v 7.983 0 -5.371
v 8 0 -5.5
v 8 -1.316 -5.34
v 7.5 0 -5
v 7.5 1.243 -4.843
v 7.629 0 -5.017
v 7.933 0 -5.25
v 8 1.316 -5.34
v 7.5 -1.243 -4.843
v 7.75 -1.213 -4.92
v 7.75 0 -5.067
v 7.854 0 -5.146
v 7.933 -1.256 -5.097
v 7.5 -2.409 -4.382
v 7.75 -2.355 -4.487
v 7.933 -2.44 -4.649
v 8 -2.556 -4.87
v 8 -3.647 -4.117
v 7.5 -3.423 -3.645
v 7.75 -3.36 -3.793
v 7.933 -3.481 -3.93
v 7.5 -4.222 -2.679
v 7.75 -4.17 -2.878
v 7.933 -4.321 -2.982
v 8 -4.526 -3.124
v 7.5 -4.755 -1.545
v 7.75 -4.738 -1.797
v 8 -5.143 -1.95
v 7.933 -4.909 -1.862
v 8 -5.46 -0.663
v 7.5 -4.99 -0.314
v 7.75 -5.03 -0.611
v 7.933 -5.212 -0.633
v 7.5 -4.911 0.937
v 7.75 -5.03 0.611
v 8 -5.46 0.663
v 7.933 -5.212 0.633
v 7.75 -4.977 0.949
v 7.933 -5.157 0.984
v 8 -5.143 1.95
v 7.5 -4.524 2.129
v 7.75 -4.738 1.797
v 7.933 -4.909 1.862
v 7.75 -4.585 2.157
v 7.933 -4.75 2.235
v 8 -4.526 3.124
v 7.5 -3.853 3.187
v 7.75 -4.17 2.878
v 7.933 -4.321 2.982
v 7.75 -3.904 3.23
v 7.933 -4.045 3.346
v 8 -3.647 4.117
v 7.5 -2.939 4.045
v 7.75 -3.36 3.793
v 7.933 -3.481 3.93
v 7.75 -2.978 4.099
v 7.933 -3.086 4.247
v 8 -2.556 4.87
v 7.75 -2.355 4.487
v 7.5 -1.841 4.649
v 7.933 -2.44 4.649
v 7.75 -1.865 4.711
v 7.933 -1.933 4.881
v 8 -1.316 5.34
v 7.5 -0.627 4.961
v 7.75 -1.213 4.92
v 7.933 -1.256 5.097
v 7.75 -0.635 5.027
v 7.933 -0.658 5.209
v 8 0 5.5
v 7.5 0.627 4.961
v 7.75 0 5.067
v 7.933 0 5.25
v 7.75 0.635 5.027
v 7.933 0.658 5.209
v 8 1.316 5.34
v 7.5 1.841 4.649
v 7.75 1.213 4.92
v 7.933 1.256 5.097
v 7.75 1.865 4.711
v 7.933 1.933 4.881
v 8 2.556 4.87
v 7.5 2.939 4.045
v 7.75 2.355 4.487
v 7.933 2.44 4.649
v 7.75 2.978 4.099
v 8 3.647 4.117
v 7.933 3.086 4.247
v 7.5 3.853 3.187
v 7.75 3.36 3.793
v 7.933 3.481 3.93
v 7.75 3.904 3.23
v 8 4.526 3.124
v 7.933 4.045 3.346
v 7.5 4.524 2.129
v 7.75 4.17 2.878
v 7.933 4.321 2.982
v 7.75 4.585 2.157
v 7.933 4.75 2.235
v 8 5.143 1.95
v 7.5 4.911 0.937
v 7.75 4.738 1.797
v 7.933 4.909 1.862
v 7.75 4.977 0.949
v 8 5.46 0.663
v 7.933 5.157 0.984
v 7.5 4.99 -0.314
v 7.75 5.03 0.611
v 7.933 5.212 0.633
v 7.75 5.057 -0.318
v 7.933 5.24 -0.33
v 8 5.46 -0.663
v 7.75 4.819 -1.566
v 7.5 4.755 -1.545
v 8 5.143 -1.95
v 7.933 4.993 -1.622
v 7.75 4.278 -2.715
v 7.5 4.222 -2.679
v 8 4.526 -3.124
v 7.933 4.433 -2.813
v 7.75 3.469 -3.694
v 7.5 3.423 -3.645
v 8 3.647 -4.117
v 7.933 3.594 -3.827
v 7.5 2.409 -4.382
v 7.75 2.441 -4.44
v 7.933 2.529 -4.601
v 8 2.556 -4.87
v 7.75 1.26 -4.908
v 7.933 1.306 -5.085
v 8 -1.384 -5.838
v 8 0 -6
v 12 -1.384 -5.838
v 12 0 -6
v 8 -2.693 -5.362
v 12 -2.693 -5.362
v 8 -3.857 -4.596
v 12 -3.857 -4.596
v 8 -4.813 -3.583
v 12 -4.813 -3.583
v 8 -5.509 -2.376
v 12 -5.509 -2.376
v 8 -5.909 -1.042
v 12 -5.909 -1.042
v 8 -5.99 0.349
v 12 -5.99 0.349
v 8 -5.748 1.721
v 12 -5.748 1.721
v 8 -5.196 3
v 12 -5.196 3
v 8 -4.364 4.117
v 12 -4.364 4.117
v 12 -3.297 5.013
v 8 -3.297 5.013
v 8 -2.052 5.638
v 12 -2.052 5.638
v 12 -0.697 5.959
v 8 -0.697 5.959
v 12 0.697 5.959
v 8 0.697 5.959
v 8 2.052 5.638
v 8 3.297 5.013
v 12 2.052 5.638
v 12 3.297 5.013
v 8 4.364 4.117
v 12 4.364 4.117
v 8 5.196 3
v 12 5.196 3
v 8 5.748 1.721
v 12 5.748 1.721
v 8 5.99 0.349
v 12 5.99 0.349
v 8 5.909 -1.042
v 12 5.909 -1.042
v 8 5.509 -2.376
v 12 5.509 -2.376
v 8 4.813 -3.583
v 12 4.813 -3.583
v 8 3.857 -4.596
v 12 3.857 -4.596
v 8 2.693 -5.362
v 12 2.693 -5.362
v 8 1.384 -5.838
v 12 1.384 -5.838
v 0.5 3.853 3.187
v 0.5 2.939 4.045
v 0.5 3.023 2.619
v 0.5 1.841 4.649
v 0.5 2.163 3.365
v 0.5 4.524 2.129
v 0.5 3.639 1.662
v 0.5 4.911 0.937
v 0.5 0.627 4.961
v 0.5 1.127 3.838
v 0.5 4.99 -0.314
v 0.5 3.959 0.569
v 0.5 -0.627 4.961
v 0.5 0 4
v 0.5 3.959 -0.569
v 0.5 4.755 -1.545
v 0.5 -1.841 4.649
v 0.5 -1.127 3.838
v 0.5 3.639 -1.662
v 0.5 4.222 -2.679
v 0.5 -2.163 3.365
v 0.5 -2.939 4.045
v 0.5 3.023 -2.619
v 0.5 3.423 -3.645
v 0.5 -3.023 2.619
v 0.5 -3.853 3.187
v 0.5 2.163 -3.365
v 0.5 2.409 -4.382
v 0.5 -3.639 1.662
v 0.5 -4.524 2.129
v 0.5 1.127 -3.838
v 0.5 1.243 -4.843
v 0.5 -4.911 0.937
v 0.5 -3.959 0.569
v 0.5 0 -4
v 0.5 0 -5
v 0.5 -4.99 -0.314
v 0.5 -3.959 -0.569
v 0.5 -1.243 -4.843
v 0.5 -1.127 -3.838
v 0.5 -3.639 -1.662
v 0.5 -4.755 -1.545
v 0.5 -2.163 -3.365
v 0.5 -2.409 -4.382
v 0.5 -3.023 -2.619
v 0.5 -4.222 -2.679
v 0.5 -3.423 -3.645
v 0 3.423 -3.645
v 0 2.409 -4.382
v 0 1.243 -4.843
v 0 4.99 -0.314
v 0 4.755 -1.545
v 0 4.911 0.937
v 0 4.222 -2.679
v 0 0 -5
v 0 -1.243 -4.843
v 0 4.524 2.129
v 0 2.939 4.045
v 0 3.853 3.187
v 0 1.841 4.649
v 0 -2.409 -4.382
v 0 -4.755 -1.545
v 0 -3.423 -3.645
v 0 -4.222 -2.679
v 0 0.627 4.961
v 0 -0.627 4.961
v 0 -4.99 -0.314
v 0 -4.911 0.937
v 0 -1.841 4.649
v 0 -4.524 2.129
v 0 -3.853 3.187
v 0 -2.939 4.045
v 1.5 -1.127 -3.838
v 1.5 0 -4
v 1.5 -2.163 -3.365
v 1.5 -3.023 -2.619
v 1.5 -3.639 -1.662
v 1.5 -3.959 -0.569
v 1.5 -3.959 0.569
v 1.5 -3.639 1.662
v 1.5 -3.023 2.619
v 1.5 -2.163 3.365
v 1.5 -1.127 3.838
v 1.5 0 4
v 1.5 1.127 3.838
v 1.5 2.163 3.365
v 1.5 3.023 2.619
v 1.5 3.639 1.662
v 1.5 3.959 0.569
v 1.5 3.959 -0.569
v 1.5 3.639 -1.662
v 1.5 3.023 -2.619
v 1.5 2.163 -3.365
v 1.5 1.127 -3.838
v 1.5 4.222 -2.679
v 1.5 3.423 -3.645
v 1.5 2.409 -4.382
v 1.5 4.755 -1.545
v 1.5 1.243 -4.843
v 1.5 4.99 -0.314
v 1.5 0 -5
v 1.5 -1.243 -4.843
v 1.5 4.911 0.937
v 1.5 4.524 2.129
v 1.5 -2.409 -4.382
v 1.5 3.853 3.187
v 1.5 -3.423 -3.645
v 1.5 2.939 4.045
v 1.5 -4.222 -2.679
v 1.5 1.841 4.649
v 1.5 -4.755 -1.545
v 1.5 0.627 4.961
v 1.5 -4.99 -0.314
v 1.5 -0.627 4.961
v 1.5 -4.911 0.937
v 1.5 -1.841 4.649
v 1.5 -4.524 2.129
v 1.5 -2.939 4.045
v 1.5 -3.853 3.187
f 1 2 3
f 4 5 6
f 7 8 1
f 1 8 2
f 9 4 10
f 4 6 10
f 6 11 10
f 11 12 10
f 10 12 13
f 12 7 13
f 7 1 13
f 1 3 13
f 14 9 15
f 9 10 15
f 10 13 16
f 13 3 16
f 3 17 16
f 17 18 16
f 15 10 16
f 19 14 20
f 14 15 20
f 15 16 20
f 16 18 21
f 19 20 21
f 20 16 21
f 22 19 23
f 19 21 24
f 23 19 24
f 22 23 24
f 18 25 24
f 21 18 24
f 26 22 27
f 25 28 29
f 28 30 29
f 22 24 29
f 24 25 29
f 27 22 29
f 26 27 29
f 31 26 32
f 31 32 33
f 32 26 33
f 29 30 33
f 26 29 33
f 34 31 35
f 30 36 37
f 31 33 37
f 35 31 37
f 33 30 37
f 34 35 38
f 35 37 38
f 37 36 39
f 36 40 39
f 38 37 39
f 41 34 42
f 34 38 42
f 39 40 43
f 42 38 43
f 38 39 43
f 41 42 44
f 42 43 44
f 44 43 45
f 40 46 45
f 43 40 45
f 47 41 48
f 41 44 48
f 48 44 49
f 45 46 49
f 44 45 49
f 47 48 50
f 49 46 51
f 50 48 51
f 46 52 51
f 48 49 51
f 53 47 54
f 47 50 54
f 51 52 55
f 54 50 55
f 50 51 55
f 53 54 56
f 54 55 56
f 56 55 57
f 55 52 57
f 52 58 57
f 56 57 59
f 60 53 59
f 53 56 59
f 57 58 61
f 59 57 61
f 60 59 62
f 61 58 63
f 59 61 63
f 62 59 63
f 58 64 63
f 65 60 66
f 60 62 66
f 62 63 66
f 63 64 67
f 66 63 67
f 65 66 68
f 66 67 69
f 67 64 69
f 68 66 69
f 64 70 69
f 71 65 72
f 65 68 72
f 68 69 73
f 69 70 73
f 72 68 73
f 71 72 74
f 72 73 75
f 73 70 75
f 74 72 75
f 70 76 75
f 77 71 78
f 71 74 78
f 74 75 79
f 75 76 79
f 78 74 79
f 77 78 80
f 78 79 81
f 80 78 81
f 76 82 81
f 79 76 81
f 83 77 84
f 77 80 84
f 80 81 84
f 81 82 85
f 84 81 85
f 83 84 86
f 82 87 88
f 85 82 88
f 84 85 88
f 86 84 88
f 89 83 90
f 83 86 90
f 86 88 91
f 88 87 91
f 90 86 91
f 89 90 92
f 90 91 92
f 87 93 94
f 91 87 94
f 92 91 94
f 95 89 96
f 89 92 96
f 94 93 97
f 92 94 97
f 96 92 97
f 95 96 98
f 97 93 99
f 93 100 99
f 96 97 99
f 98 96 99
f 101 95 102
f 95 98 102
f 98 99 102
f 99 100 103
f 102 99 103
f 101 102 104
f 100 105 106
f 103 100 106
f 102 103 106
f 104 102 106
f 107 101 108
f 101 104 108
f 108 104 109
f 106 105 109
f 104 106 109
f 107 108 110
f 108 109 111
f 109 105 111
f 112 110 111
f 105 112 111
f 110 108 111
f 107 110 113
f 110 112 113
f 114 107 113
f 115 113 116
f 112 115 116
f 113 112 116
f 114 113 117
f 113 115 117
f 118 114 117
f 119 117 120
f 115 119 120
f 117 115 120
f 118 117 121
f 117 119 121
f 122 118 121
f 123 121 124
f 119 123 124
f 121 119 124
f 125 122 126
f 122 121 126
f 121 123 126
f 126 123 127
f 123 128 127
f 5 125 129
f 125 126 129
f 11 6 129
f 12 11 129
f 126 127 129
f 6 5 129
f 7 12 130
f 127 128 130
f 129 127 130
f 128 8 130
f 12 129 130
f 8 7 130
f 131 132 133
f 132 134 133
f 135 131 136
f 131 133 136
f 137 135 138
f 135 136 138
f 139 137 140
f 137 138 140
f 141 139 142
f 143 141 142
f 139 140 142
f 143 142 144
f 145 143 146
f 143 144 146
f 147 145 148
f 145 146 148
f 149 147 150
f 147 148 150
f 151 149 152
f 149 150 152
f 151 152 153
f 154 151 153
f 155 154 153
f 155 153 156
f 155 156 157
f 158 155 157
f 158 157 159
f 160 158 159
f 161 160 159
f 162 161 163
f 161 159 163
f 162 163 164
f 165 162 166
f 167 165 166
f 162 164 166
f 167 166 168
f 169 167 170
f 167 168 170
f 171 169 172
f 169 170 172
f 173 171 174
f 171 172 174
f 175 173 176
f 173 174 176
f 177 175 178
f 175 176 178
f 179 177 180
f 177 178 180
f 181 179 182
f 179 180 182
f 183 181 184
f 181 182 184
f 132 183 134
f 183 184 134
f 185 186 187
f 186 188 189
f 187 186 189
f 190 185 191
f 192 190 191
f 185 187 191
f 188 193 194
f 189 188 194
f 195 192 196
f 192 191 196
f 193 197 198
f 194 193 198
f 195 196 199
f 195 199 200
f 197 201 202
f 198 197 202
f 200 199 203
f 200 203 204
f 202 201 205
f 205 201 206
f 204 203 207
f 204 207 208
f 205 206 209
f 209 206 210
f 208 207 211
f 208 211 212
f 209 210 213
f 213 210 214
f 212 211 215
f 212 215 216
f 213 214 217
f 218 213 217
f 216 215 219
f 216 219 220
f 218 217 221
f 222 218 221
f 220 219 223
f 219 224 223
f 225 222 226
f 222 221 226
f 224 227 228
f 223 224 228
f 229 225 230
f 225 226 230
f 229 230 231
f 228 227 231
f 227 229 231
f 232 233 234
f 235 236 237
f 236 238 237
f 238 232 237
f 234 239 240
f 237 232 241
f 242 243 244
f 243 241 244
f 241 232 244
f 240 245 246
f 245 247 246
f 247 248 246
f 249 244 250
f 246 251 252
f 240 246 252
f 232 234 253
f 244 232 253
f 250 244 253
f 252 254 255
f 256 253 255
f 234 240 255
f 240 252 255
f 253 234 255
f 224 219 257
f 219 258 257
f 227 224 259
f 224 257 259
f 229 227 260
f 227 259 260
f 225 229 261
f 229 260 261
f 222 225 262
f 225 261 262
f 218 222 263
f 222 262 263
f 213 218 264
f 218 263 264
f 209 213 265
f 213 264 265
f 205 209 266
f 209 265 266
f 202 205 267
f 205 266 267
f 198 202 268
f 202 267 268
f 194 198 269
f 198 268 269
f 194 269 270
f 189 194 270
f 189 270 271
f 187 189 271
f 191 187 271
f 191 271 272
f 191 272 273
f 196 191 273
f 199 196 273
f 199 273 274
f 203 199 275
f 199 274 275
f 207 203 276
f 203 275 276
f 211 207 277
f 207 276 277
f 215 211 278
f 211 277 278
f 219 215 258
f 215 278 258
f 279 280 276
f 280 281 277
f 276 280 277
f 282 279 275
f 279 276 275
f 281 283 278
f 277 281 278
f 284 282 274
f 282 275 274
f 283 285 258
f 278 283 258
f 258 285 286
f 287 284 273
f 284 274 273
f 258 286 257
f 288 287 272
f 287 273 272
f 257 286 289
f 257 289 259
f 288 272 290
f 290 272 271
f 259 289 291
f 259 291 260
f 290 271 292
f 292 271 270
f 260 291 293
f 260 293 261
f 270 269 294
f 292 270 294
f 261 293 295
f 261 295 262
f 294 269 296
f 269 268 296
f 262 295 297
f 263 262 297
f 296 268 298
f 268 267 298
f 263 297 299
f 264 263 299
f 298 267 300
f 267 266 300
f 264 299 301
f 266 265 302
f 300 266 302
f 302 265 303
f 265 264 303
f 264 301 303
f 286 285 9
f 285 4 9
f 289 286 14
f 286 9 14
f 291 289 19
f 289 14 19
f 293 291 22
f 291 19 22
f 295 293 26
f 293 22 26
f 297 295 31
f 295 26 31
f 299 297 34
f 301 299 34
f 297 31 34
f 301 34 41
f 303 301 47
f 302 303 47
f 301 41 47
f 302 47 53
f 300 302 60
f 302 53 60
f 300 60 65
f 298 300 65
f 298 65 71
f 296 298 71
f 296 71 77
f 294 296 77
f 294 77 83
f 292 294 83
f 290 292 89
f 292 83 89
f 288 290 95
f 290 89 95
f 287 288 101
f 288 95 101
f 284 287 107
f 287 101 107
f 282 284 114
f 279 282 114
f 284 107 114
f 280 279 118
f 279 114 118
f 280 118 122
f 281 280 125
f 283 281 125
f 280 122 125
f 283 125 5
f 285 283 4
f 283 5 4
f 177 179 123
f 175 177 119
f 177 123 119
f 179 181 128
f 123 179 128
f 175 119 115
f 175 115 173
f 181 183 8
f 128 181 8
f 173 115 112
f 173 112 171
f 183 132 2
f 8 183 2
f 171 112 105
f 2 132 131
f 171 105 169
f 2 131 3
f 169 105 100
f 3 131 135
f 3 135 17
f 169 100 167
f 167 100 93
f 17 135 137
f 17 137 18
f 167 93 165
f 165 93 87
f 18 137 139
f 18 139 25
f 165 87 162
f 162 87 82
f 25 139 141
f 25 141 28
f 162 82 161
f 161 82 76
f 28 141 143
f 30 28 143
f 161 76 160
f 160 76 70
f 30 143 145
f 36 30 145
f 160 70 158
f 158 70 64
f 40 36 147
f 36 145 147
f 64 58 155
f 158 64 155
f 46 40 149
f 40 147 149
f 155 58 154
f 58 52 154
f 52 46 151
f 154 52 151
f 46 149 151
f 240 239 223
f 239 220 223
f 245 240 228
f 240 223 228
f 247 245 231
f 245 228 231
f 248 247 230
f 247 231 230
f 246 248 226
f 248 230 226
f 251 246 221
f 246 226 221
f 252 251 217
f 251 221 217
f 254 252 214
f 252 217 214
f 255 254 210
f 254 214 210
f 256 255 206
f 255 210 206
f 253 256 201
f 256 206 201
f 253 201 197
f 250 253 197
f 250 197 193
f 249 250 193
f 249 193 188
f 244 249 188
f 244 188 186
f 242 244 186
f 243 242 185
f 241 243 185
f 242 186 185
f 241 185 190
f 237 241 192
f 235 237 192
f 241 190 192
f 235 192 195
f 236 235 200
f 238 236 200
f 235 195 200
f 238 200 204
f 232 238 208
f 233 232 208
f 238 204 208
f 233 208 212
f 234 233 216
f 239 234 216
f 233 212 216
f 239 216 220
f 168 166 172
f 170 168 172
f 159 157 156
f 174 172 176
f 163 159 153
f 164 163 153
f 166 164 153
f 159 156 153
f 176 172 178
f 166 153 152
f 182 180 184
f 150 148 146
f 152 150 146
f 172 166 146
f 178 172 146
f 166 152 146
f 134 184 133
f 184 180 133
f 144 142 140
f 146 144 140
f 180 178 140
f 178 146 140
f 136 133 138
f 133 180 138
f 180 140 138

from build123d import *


with BuildPart() as part:
    # Sketch1 → Revolve1 (revolve)
    with BuildSketch(Plane(origin=(0, 0, 0), x_dir=(1, 0, 0), z_dir=(0, 1, 0))):
        with BuildLine():
            Line((0, 0), (0, 5))
            Line((0, 5), (0.5, 5))
            Line((0.5, 5), (0.5, 4))
            Line((0.5, 4), (1.5, 4))
            Line((1.5, 4), (1.5, 5))
            Line((1.5, 5), (7.5, 5))
            ThreePointArc((7.5, 5), (7.853553391, 5.146446609), (8, 5.5))
            Line((8, 5.5), (8, 6))
            Line((8, 6), (12, 6))
            Line((12, 6), (12, 0))
            Line((12, 0), (0, 0))
        make_face()
    revolve(axis=Axis((12, 0, 0), (-1, 0, 0)))


solid = part.part
